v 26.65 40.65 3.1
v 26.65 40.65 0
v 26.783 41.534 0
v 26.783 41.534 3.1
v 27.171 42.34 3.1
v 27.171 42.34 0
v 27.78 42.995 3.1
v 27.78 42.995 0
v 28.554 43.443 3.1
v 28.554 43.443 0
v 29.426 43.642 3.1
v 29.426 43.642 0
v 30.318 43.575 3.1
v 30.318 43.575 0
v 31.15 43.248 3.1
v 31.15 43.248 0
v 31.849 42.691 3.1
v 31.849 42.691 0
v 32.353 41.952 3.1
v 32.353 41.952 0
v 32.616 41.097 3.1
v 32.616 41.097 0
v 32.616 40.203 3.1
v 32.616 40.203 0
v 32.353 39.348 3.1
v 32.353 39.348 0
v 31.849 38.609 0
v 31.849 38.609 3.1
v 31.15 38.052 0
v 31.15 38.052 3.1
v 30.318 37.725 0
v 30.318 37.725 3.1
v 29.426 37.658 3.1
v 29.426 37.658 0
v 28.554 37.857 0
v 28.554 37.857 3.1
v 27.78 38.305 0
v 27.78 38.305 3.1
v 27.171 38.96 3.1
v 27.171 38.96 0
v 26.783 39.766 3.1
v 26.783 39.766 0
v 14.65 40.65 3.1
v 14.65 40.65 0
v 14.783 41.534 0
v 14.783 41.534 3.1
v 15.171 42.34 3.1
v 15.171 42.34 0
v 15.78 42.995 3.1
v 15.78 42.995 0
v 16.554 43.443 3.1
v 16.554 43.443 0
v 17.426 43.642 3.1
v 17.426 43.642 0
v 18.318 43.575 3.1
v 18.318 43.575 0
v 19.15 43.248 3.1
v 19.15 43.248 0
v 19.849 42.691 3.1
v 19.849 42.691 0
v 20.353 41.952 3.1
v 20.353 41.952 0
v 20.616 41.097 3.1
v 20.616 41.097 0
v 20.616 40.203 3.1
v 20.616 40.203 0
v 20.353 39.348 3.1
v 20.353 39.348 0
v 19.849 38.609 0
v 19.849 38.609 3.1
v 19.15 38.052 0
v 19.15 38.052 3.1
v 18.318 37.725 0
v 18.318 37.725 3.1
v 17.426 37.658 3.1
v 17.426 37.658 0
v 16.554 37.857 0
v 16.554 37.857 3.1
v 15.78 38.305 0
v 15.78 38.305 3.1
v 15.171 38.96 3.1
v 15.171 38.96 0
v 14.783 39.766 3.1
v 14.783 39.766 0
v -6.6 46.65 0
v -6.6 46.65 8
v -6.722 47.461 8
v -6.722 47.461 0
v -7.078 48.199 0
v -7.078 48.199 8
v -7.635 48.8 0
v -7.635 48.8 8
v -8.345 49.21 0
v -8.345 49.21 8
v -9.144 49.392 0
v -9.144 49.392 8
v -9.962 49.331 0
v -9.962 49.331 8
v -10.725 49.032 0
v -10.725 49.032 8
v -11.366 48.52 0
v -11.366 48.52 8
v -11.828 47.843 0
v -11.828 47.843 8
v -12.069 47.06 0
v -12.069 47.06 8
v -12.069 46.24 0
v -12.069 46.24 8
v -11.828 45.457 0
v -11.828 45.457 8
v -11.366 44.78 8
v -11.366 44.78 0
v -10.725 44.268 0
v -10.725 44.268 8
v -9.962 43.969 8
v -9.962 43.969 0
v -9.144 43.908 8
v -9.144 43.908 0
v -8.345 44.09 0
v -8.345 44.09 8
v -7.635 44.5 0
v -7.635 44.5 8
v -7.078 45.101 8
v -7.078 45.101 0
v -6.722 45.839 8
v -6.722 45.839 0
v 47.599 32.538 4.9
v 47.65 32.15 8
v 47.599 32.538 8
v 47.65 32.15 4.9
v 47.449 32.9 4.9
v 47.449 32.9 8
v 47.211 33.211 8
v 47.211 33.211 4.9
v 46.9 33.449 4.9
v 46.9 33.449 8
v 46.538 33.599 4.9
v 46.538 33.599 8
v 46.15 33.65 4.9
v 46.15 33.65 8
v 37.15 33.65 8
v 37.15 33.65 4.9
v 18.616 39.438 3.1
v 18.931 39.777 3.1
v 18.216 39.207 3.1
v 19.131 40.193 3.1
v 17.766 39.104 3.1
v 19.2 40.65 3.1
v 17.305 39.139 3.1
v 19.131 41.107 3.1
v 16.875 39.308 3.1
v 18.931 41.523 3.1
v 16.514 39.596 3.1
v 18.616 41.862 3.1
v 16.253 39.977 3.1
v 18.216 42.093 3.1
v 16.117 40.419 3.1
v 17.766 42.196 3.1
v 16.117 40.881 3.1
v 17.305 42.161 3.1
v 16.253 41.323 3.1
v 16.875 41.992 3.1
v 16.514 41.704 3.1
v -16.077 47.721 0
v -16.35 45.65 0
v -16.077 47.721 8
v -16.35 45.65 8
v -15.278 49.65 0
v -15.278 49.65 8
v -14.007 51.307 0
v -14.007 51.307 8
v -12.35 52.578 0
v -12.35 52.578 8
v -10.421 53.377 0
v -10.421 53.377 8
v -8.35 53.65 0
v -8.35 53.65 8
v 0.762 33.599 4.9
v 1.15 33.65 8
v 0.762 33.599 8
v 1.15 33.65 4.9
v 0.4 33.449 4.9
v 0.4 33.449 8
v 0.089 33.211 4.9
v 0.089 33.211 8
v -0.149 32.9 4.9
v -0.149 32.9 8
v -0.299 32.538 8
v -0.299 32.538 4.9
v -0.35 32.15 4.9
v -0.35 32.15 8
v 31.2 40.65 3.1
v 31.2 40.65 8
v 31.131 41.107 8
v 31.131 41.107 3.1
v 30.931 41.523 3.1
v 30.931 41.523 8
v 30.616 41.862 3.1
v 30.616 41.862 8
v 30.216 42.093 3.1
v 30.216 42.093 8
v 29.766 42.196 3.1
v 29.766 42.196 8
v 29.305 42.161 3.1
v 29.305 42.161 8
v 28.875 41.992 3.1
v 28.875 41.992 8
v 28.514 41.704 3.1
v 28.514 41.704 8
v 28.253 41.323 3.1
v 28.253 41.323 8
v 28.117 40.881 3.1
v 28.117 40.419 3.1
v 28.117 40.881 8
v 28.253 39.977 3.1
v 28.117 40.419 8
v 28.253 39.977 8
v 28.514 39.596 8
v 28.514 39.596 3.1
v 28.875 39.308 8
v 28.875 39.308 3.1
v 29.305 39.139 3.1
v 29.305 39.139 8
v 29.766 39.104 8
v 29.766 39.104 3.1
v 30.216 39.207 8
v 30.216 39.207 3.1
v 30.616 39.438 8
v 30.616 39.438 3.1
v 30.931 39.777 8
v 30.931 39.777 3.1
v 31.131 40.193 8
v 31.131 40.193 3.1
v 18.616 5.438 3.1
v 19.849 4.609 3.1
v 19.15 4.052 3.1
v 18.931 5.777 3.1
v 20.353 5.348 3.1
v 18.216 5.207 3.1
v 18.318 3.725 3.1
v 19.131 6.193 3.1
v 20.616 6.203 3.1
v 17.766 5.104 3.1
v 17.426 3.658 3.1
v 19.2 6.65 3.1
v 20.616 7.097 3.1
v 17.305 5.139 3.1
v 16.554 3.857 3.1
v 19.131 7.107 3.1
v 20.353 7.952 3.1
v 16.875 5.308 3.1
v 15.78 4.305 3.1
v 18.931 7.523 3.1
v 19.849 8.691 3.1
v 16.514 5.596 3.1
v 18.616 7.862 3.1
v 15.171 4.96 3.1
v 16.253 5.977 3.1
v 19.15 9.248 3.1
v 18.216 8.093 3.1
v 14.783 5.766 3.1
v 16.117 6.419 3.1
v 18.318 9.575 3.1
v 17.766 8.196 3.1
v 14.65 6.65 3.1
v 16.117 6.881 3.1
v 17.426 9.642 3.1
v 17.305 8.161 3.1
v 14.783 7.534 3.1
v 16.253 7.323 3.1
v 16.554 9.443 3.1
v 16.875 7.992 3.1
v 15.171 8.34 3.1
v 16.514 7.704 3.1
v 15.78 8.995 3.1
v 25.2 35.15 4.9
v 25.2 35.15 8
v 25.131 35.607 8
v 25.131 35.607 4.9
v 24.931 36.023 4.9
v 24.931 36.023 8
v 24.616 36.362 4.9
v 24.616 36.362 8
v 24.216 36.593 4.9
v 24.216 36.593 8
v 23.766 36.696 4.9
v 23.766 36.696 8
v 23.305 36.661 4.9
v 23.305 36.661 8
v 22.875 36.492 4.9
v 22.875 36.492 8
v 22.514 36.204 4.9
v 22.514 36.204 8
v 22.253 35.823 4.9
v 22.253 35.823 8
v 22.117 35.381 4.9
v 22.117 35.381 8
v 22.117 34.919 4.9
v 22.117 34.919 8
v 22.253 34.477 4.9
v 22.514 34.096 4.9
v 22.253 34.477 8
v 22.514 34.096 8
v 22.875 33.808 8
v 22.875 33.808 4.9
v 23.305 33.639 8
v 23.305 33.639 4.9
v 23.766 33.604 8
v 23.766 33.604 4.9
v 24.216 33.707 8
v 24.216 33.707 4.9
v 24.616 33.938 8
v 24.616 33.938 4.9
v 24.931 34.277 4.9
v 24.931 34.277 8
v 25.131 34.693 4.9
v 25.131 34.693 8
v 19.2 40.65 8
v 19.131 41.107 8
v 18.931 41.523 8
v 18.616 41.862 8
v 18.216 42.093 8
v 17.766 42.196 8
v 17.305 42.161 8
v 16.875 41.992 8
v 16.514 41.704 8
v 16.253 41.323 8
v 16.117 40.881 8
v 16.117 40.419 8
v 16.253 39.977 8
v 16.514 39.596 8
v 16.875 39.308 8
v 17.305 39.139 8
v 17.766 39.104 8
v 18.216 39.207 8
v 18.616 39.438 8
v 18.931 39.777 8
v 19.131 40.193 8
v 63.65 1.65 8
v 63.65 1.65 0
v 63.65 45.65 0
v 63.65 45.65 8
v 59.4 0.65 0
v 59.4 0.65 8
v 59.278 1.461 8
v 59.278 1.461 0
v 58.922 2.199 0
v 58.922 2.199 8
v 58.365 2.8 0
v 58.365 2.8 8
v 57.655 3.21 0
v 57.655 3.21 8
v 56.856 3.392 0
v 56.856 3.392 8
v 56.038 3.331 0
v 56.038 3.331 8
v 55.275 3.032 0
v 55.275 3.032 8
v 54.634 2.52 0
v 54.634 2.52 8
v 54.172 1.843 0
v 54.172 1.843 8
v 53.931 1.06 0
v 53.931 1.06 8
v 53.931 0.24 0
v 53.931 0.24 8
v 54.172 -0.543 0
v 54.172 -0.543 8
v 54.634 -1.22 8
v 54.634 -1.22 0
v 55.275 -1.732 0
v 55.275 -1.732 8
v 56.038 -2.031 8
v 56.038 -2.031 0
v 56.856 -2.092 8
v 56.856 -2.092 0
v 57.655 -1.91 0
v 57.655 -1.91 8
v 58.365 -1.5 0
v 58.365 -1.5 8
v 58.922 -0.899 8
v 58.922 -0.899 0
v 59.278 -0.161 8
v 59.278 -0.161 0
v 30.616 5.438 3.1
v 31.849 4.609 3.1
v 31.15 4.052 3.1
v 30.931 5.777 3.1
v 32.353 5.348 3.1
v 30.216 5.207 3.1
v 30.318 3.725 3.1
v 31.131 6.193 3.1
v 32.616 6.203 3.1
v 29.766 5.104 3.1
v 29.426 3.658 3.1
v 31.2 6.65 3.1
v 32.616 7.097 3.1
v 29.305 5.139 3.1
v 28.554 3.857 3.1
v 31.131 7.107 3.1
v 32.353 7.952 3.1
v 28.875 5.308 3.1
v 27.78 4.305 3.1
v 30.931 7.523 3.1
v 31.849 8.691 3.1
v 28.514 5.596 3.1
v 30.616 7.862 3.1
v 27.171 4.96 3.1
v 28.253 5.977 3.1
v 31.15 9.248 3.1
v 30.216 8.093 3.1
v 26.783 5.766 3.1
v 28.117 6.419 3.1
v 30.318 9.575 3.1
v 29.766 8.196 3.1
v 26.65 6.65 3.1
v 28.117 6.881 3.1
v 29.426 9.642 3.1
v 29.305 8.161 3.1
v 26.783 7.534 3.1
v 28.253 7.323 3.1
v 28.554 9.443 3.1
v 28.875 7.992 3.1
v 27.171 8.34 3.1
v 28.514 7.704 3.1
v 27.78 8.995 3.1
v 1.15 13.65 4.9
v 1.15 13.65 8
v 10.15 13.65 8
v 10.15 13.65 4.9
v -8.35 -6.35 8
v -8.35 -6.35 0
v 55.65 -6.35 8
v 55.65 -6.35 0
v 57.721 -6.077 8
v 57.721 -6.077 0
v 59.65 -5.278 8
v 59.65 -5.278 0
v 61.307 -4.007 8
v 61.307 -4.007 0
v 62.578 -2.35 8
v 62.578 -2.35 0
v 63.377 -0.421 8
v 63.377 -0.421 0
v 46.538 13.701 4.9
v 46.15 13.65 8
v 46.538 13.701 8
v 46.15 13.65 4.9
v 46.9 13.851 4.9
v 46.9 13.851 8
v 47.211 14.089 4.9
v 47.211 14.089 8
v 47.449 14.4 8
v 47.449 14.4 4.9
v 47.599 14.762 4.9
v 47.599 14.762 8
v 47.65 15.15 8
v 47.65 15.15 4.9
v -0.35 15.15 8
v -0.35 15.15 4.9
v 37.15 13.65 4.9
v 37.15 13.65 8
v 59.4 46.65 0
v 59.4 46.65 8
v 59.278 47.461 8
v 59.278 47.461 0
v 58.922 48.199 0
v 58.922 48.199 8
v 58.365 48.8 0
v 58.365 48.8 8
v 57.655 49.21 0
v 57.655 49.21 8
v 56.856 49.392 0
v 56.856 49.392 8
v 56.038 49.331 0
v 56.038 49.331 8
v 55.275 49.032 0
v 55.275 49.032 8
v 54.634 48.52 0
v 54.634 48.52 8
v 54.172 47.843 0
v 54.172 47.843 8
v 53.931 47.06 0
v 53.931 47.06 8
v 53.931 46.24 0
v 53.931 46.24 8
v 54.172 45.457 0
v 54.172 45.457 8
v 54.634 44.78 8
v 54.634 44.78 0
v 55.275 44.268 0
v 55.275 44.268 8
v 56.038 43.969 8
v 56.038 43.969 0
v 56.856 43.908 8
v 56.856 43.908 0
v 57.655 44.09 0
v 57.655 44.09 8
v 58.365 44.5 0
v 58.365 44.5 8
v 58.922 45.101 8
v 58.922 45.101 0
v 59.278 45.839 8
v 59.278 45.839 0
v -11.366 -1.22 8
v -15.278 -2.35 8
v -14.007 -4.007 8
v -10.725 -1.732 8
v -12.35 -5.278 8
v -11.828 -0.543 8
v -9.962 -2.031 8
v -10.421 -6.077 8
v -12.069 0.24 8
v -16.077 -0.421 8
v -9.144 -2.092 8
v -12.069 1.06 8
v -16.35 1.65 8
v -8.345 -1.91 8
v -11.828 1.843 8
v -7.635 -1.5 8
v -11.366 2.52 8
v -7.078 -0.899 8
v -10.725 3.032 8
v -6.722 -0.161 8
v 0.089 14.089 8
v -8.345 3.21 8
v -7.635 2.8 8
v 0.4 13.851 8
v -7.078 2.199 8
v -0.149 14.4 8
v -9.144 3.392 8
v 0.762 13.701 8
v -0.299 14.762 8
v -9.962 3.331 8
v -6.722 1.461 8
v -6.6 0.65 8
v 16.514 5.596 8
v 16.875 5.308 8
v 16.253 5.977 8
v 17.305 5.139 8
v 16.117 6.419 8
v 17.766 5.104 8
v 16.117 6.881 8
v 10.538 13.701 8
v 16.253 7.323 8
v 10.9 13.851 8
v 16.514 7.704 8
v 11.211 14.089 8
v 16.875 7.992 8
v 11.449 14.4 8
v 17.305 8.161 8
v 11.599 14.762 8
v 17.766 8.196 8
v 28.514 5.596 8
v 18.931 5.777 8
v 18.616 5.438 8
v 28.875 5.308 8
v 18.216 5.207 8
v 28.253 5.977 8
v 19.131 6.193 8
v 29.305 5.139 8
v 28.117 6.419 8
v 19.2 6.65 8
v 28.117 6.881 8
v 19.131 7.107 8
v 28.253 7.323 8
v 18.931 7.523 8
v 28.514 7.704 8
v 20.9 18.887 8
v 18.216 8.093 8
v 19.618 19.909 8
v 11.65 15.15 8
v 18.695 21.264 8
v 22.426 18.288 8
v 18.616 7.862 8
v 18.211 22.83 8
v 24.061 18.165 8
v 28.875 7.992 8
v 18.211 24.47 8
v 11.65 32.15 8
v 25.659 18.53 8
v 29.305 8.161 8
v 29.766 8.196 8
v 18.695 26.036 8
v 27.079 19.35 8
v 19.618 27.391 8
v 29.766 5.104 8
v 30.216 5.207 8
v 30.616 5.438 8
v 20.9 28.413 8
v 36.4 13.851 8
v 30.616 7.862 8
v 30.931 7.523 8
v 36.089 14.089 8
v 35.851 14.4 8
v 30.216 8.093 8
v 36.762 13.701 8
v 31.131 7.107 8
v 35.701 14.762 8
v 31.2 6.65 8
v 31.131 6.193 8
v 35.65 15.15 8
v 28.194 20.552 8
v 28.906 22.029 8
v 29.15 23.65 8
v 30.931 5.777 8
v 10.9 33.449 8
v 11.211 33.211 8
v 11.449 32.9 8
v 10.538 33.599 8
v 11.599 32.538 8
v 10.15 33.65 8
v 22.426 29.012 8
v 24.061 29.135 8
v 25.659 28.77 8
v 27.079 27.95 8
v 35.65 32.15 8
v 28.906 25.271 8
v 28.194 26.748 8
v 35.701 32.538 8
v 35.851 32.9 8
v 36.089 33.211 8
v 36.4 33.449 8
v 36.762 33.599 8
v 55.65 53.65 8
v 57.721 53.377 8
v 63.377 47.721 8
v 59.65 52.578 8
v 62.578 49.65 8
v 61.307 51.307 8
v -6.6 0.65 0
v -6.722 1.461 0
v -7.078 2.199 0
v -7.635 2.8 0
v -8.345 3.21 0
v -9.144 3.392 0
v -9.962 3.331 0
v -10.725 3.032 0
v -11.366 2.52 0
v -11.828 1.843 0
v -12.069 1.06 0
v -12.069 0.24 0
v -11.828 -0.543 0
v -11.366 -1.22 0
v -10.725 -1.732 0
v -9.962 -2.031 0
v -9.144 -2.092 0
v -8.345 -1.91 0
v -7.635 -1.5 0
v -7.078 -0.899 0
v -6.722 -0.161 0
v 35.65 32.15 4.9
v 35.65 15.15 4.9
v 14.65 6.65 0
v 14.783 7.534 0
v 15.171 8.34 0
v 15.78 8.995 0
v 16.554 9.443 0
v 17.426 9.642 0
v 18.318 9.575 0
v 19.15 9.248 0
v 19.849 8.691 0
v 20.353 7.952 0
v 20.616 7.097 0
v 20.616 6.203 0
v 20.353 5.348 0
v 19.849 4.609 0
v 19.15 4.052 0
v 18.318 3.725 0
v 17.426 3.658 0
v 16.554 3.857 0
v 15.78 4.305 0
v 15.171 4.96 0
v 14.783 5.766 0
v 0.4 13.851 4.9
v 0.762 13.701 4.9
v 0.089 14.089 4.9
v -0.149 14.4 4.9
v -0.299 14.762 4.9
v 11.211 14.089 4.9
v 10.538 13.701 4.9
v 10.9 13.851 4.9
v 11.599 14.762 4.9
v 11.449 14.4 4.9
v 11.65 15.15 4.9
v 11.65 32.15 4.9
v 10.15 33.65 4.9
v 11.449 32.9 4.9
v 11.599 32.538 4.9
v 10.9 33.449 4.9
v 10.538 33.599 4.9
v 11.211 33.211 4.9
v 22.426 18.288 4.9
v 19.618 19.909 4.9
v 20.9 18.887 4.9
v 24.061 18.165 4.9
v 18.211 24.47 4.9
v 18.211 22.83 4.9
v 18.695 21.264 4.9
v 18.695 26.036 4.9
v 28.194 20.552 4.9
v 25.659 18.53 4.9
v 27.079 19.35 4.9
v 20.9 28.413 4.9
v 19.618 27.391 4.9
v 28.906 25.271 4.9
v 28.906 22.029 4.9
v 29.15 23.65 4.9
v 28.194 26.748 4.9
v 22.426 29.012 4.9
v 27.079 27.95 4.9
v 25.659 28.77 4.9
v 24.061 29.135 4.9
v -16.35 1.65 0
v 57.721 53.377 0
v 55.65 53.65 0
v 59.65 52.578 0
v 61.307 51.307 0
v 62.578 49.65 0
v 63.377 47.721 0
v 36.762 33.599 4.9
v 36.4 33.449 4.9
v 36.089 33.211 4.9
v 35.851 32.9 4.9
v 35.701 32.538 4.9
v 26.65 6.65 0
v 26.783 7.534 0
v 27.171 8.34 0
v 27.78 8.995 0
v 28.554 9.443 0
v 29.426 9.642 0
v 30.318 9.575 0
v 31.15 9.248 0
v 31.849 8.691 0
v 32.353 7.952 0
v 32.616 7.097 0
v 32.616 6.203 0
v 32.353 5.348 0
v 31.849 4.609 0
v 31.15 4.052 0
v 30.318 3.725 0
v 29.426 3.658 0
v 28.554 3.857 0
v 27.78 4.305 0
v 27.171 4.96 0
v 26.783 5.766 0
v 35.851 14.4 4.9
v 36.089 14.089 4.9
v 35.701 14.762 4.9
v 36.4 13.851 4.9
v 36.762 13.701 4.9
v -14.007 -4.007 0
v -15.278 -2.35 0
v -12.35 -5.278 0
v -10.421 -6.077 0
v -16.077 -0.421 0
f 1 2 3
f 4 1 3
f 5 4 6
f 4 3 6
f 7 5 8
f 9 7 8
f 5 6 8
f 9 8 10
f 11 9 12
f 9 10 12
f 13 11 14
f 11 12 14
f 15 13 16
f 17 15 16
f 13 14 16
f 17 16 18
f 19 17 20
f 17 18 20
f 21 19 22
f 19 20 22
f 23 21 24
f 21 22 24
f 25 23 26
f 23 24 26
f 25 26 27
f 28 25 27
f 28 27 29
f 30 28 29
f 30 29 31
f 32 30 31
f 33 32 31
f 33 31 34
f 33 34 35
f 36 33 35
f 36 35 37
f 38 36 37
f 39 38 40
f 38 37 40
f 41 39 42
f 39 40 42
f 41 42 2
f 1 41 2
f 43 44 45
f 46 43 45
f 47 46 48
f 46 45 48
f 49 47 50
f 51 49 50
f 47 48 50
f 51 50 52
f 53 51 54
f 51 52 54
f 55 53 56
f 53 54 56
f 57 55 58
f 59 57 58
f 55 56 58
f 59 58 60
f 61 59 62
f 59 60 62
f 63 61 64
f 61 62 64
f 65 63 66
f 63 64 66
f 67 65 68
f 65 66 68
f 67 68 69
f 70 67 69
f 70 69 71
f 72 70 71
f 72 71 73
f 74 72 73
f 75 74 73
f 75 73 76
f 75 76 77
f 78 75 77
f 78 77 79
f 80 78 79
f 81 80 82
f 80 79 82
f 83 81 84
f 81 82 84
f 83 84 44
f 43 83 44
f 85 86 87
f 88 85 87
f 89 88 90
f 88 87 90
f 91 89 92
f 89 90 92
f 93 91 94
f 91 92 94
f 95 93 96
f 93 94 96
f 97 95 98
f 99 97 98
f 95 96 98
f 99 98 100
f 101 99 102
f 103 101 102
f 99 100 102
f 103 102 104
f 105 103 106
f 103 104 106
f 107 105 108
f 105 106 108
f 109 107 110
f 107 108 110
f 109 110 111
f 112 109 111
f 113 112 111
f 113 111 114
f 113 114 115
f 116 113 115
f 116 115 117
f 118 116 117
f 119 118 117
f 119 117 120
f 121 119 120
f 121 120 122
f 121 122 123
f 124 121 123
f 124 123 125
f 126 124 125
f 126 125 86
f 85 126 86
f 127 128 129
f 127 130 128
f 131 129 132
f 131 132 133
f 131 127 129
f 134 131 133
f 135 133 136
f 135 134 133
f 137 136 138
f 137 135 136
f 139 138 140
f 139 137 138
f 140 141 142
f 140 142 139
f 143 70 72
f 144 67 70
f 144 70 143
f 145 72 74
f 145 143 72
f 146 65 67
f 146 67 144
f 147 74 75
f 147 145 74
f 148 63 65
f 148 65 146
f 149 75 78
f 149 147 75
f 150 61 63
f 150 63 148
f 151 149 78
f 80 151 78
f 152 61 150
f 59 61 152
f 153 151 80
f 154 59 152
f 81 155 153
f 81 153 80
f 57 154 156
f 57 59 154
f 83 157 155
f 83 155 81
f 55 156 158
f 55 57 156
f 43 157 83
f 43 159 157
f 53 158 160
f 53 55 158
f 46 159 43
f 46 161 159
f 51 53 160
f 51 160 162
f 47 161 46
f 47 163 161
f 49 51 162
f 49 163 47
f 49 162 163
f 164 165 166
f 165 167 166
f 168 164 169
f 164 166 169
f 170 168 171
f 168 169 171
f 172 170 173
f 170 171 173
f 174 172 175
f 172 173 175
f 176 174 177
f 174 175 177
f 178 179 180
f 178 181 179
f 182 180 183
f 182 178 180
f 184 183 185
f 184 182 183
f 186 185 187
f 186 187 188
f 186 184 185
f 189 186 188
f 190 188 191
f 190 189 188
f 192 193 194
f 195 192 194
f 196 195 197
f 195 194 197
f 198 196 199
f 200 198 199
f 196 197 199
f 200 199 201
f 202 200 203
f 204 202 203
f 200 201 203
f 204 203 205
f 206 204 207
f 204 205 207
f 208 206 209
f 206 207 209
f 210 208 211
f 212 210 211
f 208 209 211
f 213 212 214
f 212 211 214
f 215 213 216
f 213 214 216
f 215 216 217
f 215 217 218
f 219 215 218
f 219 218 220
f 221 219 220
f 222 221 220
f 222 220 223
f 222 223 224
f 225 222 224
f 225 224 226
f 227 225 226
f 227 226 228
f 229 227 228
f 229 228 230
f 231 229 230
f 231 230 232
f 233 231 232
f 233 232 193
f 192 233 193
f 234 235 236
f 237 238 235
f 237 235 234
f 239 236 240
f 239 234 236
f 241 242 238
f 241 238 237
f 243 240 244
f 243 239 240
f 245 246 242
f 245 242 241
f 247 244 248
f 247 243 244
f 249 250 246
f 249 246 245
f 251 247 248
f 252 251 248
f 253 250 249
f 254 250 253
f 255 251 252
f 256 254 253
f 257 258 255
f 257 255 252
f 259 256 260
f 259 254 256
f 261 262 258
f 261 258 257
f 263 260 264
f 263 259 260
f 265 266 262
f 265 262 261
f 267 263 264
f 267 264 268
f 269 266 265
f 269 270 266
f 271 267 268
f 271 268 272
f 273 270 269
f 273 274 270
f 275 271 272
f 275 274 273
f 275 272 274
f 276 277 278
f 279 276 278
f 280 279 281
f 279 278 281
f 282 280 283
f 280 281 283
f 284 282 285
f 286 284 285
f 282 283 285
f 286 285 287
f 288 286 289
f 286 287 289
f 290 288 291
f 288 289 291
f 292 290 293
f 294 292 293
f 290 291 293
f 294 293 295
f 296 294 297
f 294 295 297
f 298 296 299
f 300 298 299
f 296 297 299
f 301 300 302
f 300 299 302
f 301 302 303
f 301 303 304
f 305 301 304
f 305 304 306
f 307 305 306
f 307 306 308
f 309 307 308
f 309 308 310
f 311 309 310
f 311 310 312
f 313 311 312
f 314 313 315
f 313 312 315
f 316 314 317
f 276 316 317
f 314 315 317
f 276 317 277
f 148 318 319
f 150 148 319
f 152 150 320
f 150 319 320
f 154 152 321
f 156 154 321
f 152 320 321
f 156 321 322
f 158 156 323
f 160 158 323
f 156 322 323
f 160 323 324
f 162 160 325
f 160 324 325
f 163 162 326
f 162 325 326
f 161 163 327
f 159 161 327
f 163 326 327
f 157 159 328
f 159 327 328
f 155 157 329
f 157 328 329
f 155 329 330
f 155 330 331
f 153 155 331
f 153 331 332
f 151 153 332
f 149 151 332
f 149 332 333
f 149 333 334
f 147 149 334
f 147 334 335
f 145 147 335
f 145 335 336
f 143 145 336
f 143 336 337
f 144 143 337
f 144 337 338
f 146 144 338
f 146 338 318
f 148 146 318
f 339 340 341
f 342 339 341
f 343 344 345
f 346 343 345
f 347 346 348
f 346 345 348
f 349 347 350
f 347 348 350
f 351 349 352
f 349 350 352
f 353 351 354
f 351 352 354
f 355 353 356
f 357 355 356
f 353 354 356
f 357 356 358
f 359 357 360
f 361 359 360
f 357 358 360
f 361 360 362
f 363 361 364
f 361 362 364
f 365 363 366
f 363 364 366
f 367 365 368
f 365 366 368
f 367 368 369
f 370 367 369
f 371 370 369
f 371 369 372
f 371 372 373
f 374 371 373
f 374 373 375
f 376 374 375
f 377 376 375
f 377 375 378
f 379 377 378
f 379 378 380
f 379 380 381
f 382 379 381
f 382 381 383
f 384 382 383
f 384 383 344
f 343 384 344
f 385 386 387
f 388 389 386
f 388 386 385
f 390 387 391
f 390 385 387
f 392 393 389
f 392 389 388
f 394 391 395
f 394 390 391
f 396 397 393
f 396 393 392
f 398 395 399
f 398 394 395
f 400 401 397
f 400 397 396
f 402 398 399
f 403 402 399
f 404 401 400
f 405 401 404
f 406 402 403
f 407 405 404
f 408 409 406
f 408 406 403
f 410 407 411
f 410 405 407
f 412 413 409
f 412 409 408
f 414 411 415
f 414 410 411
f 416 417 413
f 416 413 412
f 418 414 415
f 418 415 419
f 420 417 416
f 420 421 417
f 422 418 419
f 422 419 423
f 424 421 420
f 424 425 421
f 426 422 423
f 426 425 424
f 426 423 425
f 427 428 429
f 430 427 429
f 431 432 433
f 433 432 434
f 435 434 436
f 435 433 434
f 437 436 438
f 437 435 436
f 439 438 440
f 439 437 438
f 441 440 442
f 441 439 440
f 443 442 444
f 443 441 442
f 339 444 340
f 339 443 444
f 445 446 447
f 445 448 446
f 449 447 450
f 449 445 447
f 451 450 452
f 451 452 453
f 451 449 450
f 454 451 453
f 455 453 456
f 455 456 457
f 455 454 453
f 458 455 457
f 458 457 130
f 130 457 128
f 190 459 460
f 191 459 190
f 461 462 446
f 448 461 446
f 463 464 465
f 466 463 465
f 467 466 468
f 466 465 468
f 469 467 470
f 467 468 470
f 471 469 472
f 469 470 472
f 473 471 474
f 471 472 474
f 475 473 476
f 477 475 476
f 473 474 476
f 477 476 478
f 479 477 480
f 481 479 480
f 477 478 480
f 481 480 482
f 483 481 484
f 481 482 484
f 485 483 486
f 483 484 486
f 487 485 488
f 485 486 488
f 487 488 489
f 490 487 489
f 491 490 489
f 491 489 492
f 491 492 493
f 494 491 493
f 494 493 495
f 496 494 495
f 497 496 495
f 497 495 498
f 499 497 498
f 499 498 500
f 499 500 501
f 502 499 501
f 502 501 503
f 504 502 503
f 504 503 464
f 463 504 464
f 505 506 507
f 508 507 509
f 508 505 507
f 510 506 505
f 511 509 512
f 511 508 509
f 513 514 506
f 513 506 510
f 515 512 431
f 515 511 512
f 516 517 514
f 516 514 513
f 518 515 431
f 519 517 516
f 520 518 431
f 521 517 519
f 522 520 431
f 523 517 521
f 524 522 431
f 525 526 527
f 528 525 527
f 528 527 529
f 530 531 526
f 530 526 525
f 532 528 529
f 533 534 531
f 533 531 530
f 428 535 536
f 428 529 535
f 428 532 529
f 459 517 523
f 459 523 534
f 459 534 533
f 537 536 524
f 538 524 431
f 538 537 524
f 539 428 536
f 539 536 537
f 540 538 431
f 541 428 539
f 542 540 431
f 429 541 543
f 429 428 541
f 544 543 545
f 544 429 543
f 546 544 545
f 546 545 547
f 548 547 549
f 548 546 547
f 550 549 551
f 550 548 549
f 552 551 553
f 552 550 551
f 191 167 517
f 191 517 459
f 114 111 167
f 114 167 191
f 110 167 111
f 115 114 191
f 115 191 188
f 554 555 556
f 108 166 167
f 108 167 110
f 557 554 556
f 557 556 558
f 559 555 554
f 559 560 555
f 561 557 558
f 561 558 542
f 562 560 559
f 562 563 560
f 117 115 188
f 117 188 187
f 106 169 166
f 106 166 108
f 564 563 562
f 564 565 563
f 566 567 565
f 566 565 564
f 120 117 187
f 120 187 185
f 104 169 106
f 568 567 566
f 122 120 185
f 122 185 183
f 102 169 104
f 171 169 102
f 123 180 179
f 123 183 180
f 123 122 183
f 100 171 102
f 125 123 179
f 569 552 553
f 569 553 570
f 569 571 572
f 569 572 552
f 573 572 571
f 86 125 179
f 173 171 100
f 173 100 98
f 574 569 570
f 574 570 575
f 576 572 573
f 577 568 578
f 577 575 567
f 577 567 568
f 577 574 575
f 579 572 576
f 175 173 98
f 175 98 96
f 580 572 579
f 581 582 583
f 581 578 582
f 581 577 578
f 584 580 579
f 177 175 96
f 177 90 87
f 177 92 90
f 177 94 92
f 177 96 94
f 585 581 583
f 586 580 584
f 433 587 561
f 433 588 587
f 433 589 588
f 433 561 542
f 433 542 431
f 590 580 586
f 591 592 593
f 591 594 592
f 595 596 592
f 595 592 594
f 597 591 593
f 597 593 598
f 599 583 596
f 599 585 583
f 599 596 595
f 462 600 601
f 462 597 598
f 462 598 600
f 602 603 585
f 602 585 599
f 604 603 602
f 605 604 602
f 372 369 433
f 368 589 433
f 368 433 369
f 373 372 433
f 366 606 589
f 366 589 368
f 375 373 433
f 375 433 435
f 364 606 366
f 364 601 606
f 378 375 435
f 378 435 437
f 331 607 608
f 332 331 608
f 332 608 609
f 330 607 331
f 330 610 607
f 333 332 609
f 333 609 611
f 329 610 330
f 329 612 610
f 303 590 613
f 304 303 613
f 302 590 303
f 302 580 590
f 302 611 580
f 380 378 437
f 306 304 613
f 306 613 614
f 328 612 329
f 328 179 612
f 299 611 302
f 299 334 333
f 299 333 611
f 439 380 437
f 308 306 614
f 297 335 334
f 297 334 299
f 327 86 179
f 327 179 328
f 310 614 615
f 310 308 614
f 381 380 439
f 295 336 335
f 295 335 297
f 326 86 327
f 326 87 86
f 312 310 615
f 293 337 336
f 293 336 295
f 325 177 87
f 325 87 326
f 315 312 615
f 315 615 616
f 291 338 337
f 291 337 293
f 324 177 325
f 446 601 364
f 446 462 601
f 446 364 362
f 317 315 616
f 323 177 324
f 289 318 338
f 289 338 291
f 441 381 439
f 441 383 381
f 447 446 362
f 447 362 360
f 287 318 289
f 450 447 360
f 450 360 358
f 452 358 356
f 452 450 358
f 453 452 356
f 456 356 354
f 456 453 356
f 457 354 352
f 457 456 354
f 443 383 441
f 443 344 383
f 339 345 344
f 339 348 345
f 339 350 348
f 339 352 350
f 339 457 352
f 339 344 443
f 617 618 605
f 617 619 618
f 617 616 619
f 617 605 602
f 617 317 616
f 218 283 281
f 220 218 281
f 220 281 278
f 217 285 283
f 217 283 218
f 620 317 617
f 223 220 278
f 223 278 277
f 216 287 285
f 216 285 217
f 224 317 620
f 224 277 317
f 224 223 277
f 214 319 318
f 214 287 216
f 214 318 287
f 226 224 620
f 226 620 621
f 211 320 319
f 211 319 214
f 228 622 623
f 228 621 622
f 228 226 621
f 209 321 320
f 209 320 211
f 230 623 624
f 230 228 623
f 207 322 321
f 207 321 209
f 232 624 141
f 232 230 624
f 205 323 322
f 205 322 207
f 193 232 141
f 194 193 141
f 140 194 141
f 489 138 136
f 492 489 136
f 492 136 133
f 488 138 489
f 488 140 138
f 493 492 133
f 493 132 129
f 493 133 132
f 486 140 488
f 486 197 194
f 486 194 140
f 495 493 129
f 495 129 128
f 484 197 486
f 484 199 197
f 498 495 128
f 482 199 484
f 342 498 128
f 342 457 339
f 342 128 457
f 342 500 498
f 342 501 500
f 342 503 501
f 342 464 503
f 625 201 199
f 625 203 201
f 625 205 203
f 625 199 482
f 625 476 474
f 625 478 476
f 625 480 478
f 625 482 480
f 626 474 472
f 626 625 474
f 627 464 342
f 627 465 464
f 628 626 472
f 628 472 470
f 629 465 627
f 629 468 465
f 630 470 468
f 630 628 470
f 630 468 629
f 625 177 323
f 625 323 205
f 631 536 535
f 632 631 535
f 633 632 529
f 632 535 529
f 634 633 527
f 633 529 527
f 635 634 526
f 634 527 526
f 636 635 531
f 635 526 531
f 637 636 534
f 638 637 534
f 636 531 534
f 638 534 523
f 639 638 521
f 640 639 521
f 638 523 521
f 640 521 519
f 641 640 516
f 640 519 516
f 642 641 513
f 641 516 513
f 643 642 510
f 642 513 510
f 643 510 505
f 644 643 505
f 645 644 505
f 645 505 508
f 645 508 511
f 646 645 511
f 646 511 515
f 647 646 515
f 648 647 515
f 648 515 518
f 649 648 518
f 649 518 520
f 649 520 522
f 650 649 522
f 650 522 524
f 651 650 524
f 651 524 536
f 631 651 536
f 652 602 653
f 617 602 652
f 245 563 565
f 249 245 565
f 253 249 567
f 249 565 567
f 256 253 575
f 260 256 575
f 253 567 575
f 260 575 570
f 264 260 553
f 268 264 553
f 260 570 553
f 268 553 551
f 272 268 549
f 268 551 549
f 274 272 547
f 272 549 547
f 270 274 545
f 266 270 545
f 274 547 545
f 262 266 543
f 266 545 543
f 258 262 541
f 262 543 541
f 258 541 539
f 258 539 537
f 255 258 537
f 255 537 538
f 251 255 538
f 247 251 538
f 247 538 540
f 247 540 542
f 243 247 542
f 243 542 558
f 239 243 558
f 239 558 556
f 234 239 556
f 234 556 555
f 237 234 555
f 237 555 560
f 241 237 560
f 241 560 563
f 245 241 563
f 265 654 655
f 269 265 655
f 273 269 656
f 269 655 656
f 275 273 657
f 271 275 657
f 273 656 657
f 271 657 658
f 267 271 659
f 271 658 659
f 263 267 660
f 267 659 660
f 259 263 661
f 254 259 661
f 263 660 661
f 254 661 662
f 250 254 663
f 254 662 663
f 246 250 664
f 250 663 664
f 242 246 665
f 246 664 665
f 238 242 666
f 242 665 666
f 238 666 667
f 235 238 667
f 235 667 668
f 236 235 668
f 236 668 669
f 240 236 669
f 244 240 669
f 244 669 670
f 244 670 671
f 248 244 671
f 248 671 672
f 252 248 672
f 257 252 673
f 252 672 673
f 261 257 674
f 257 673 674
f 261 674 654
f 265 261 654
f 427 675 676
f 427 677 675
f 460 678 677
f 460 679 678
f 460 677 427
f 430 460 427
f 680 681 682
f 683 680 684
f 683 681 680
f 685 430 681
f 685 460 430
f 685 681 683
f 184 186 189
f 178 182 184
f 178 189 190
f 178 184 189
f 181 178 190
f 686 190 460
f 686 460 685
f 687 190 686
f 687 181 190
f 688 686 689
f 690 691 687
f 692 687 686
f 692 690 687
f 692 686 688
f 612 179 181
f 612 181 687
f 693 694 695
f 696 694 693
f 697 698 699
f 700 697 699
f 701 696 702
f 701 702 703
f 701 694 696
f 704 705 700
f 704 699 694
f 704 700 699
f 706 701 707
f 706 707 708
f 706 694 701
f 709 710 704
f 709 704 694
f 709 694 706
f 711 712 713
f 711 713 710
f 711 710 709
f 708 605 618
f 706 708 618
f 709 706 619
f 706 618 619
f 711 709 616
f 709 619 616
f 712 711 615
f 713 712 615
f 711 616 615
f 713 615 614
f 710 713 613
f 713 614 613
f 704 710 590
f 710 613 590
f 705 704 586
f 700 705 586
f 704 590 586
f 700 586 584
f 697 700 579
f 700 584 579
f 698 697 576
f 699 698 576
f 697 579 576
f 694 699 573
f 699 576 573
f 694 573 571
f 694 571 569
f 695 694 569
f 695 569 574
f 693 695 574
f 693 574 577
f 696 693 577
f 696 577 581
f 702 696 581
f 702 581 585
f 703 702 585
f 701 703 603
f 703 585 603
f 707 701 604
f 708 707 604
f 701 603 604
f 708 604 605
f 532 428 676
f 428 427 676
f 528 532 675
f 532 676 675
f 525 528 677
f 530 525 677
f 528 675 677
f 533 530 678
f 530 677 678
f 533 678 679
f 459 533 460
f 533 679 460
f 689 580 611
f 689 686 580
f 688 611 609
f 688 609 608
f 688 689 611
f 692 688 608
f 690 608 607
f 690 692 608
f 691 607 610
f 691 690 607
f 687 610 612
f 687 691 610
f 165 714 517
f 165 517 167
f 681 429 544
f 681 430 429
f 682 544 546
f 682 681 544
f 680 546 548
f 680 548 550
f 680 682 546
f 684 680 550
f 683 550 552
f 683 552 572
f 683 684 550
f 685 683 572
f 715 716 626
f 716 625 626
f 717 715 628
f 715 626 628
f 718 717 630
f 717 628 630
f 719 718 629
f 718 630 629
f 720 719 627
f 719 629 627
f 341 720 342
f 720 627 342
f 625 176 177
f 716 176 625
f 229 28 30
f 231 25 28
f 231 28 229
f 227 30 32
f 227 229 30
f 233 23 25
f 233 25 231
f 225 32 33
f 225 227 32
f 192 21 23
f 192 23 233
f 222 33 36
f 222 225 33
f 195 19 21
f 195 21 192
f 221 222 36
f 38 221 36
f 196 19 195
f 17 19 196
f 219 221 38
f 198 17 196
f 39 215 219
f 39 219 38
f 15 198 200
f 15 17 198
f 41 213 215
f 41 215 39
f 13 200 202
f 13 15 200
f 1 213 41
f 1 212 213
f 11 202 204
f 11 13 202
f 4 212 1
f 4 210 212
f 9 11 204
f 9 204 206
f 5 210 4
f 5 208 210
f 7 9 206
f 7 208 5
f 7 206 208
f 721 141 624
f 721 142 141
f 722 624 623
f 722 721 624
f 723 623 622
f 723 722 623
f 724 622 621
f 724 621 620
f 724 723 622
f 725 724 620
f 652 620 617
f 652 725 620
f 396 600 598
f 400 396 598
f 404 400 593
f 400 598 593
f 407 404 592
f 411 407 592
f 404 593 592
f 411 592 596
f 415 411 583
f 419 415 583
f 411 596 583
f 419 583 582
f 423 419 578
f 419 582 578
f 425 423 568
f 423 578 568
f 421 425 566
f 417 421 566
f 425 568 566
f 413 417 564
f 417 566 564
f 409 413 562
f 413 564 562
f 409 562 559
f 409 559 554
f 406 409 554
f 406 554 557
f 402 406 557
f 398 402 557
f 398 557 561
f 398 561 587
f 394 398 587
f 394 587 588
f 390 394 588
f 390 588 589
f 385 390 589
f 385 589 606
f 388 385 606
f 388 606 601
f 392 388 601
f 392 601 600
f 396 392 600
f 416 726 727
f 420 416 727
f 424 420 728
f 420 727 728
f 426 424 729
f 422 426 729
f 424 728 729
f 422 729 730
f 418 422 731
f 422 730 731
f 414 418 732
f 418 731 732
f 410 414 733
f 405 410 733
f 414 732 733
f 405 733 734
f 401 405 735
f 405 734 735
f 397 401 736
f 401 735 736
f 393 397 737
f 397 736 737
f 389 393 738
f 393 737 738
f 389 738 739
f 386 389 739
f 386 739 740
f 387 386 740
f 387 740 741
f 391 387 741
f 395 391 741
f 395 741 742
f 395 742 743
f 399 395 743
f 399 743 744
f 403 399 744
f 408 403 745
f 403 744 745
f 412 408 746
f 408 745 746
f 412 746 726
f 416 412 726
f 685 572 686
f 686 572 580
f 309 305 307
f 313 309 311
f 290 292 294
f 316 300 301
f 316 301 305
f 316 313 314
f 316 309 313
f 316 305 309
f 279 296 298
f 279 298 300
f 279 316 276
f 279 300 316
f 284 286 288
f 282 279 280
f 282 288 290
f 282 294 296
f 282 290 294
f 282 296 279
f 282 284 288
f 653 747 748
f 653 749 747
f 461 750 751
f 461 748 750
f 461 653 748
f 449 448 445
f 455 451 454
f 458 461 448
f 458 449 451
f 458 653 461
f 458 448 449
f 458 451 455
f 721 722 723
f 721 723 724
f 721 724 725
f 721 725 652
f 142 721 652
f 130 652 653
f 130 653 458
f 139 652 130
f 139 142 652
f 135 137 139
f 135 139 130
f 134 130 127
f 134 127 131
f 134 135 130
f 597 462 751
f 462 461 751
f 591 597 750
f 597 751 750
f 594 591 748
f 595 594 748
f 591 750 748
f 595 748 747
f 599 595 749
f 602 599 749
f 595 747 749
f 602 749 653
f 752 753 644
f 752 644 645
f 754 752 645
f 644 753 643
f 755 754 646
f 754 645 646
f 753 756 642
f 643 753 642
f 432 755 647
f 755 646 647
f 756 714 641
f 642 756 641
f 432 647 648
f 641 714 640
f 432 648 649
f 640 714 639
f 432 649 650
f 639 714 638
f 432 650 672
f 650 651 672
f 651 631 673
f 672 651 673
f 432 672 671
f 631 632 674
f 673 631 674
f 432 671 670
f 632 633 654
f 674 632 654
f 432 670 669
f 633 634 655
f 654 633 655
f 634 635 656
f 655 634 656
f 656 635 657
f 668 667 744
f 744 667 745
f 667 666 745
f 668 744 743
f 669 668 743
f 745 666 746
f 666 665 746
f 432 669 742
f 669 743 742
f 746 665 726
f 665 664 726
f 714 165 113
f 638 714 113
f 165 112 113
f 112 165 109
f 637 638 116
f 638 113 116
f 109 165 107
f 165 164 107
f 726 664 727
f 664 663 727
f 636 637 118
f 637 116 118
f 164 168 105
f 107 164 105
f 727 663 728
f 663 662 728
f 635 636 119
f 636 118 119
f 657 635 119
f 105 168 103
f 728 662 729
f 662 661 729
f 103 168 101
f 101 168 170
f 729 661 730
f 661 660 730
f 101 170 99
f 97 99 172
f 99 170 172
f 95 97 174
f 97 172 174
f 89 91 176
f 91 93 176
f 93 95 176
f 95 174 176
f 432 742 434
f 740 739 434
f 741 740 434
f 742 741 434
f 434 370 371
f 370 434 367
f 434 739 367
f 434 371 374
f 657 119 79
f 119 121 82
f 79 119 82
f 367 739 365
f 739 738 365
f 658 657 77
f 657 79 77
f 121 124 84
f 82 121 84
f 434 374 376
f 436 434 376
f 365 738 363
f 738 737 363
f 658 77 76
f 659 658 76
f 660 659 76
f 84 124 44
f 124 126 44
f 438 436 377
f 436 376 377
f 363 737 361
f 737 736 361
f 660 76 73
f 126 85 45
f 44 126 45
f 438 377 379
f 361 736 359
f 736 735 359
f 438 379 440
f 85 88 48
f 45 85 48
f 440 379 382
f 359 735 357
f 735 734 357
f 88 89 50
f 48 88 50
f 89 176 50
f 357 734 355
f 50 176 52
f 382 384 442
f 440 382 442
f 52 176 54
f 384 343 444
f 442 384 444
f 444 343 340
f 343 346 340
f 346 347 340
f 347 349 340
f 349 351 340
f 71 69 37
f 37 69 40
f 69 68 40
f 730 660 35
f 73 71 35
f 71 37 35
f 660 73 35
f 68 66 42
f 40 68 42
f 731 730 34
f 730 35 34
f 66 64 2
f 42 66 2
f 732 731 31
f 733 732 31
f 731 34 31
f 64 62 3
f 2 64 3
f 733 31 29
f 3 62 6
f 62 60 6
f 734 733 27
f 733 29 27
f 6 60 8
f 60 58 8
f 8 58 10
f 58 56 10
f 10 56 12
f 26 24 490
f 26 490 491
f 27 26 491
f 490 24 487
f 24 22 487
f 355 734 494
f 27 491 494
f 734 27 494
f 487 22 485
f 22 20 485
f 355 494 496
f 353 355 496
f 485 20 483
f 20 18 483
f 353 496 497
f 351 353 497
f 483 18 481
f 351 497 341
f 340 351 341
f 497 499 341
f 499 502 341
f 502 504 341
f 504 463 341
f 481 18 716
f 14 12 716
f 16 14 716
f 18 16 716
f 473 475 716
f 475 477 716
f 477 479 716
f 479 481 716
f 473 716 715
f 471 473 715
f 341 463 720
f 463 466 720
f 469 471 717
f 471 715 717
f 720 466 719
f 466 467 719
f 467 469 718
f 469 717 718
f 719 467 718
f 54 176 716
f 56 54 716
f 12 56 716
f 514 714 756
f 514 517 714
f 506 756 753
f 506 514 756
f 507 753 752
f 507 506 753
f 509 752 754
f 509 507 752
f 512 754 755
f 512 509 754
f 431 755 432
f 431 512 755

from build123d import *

# Parameters (mm, degrees)
SKETCH_1_W          = 80
SKETCH_1_H          = 60
SKETCH_1_W_2        = 47.3
SKETCH_1_H_2        = 47.3
EXTRUDE_1_DEPTH     = 8
SKETCH_2_R          = 5.5
SKETCH_2_R_2        = 1.55
SKETCH_2_W          = 12
SKETCH_2_H          = 20
CUT_EXTRUDE_1_DEPTH = 3.1
FILLET_1_R          = 1.5
SKETCH_3_R          = 1.55
CUT_EXTRUDE_2_DEPTH = 10
FILLET_2_R          = 8
SKETCH_4_R          = 3
CUT_EXTRUDE_3_DEPTH = 3.1
SKETCH_5_R          = 2.75
CUT_EXTRUDE_4_DEPTH = 10


with BuildPart() as part:
    # ｽｹｯﾁ1 → ﾎﾞｽ - 押し出し1 (new body)
    # profile 1 of 2: a face of its own
    with BuildSketch(Plane.XY):
        with Locations((23.65, 23.65)):
            Rectangle(SKETCH_1_W, SKETCH_1_H)
        with Locations((23.65, 23.65)):
            Rectangle(SKETCH_1_W_2, SKETCH_1_H_2, mode=Mode.SUBTRACT)
    # profile 2 of 2: a face of its own
    with BuildSketch(Plane.XY):
        with Locations((23.65, 23.65)):
            Rectangle(SKETCH_1_W_2, SKETCH_1_H_2)
    extrude(amount=EXTRUDE_1_DEPTH)

    # ｽｹｯﾁ2 → ｶｯﾄ - 押し出し1 (cut)
    with BuildSketch(Plane.XY.offset(8)):
        with Locations((23.65, 23.65)):
            Circle(SKETCH_2_R)
        with Locations((23.65, 35.15)):
            Circle(SKETCH_2_R_2)
        with Locations((5.65, 23.65)):
            Rectangle(SKETCH_2_W, SKETCH_2_H)
        with Locations((41.65, 23.65)):
            Rectangle(SKETCH_2_W, SKETCH_2_H)
    extrude(amount=-CUT_EXTRUDE_1_DEPTH, mode=Mode.SUBTRACT)

    # ﾌｨﾚｯﾄ1
    fillet_1_edges = [part.edges().sort_by_distance(p)[0] for p in [
        (11.65, 33.65, 6.45),
        (11.65, 13.65, 6.45),
        (-0.35, 13.65, 6.45),
        (-0.35, 33.65, 6.45),
        (47.65, 33.65, 6.45),
        (47.65, 13.65, 6.45),
        (35.65, 13.65, 6.45),
        (35.65, 33.65, 6.45),
    ]]
    fillet(fillet_1_edges, radius=FILLET_1_R)

    # ｽｹｯﾁ3 → ｶｯﾄ - 押し出し2 (cut)
    with BuildSketch(Plane.XY.offset(8)):
        with Locations((17.65, 40.65)):
            Circle(SKETCH_3_R)
        with Locations((29.65, 40.65)):
            Circle(SKETCH_3_R)
        with Locations((29.65, 6.65)):
            Circle(SKETCH_3_R)
        with Locations((17.65, 6.65)):
            Circle(SKETCH_3_R)
    extrude(amount=-CUT_EXTRUDE_2_DEPTH, mode=Mode.SUBTRACT)

    # ﾌｨﾚｯﾄ2
    fillet_2_edges = [part.edges().sort_by_distance(p)[0] for p in [
        (63.65, -6.35, 4),
        (-16.35, -6.35, 4),
        (-16.35, 53.65, 4),
        (63.65, 53.65, 4),
    ]]
    fillet(fillet_2_edges, radius=FILLET_2_R)

    # ｽｹｯﾁ4 → ｶｯﾄ - 押し出し3 (cut)
    with BuildSketch(Plane(origin=(0, 0, 0), x_dir=(-1, 0, 0), z_dir=(0, 0, -1))):
        with Locations((-29.65, 40.65)):
            Circle(SKETCH_4_R)
        with Locations((-17.65, 40.65)):
            Circle(SKETCH_4_R)
        with Locations((-17.65, 6.65)):
            Circle(SKETCH_4_R)
        with Locations((-29.65, 6.65)):
            Circle(SKETCH_4_R)
    extrude(amount=-CUT_EXTRUDE_3_DEPTH, mode=Mode.SUBTRACT)

    # ｽｹｯﾁ5 → ｶｯﾄ - 押し出し4 (cut)
    with BuildSketch(Plane.XY.offset(8)):
        with Locations((56.65, 0.65)):
            Circle(SKETCH_5_R)
        with Locations((56.65, 46.65)):
            Circle(SKETCH_5_R)
        with Locations((-9.35, 46.65)):
            Circle(SKETCH_5_R)
        with Locations((-9.35, 0.65)):
            Circle(SKETCH_5_R)
    extrude(amount=-CUT_EXTRUDE_4_DEPTH, mode=Mode.SUBTRACT)


solid = part.part
